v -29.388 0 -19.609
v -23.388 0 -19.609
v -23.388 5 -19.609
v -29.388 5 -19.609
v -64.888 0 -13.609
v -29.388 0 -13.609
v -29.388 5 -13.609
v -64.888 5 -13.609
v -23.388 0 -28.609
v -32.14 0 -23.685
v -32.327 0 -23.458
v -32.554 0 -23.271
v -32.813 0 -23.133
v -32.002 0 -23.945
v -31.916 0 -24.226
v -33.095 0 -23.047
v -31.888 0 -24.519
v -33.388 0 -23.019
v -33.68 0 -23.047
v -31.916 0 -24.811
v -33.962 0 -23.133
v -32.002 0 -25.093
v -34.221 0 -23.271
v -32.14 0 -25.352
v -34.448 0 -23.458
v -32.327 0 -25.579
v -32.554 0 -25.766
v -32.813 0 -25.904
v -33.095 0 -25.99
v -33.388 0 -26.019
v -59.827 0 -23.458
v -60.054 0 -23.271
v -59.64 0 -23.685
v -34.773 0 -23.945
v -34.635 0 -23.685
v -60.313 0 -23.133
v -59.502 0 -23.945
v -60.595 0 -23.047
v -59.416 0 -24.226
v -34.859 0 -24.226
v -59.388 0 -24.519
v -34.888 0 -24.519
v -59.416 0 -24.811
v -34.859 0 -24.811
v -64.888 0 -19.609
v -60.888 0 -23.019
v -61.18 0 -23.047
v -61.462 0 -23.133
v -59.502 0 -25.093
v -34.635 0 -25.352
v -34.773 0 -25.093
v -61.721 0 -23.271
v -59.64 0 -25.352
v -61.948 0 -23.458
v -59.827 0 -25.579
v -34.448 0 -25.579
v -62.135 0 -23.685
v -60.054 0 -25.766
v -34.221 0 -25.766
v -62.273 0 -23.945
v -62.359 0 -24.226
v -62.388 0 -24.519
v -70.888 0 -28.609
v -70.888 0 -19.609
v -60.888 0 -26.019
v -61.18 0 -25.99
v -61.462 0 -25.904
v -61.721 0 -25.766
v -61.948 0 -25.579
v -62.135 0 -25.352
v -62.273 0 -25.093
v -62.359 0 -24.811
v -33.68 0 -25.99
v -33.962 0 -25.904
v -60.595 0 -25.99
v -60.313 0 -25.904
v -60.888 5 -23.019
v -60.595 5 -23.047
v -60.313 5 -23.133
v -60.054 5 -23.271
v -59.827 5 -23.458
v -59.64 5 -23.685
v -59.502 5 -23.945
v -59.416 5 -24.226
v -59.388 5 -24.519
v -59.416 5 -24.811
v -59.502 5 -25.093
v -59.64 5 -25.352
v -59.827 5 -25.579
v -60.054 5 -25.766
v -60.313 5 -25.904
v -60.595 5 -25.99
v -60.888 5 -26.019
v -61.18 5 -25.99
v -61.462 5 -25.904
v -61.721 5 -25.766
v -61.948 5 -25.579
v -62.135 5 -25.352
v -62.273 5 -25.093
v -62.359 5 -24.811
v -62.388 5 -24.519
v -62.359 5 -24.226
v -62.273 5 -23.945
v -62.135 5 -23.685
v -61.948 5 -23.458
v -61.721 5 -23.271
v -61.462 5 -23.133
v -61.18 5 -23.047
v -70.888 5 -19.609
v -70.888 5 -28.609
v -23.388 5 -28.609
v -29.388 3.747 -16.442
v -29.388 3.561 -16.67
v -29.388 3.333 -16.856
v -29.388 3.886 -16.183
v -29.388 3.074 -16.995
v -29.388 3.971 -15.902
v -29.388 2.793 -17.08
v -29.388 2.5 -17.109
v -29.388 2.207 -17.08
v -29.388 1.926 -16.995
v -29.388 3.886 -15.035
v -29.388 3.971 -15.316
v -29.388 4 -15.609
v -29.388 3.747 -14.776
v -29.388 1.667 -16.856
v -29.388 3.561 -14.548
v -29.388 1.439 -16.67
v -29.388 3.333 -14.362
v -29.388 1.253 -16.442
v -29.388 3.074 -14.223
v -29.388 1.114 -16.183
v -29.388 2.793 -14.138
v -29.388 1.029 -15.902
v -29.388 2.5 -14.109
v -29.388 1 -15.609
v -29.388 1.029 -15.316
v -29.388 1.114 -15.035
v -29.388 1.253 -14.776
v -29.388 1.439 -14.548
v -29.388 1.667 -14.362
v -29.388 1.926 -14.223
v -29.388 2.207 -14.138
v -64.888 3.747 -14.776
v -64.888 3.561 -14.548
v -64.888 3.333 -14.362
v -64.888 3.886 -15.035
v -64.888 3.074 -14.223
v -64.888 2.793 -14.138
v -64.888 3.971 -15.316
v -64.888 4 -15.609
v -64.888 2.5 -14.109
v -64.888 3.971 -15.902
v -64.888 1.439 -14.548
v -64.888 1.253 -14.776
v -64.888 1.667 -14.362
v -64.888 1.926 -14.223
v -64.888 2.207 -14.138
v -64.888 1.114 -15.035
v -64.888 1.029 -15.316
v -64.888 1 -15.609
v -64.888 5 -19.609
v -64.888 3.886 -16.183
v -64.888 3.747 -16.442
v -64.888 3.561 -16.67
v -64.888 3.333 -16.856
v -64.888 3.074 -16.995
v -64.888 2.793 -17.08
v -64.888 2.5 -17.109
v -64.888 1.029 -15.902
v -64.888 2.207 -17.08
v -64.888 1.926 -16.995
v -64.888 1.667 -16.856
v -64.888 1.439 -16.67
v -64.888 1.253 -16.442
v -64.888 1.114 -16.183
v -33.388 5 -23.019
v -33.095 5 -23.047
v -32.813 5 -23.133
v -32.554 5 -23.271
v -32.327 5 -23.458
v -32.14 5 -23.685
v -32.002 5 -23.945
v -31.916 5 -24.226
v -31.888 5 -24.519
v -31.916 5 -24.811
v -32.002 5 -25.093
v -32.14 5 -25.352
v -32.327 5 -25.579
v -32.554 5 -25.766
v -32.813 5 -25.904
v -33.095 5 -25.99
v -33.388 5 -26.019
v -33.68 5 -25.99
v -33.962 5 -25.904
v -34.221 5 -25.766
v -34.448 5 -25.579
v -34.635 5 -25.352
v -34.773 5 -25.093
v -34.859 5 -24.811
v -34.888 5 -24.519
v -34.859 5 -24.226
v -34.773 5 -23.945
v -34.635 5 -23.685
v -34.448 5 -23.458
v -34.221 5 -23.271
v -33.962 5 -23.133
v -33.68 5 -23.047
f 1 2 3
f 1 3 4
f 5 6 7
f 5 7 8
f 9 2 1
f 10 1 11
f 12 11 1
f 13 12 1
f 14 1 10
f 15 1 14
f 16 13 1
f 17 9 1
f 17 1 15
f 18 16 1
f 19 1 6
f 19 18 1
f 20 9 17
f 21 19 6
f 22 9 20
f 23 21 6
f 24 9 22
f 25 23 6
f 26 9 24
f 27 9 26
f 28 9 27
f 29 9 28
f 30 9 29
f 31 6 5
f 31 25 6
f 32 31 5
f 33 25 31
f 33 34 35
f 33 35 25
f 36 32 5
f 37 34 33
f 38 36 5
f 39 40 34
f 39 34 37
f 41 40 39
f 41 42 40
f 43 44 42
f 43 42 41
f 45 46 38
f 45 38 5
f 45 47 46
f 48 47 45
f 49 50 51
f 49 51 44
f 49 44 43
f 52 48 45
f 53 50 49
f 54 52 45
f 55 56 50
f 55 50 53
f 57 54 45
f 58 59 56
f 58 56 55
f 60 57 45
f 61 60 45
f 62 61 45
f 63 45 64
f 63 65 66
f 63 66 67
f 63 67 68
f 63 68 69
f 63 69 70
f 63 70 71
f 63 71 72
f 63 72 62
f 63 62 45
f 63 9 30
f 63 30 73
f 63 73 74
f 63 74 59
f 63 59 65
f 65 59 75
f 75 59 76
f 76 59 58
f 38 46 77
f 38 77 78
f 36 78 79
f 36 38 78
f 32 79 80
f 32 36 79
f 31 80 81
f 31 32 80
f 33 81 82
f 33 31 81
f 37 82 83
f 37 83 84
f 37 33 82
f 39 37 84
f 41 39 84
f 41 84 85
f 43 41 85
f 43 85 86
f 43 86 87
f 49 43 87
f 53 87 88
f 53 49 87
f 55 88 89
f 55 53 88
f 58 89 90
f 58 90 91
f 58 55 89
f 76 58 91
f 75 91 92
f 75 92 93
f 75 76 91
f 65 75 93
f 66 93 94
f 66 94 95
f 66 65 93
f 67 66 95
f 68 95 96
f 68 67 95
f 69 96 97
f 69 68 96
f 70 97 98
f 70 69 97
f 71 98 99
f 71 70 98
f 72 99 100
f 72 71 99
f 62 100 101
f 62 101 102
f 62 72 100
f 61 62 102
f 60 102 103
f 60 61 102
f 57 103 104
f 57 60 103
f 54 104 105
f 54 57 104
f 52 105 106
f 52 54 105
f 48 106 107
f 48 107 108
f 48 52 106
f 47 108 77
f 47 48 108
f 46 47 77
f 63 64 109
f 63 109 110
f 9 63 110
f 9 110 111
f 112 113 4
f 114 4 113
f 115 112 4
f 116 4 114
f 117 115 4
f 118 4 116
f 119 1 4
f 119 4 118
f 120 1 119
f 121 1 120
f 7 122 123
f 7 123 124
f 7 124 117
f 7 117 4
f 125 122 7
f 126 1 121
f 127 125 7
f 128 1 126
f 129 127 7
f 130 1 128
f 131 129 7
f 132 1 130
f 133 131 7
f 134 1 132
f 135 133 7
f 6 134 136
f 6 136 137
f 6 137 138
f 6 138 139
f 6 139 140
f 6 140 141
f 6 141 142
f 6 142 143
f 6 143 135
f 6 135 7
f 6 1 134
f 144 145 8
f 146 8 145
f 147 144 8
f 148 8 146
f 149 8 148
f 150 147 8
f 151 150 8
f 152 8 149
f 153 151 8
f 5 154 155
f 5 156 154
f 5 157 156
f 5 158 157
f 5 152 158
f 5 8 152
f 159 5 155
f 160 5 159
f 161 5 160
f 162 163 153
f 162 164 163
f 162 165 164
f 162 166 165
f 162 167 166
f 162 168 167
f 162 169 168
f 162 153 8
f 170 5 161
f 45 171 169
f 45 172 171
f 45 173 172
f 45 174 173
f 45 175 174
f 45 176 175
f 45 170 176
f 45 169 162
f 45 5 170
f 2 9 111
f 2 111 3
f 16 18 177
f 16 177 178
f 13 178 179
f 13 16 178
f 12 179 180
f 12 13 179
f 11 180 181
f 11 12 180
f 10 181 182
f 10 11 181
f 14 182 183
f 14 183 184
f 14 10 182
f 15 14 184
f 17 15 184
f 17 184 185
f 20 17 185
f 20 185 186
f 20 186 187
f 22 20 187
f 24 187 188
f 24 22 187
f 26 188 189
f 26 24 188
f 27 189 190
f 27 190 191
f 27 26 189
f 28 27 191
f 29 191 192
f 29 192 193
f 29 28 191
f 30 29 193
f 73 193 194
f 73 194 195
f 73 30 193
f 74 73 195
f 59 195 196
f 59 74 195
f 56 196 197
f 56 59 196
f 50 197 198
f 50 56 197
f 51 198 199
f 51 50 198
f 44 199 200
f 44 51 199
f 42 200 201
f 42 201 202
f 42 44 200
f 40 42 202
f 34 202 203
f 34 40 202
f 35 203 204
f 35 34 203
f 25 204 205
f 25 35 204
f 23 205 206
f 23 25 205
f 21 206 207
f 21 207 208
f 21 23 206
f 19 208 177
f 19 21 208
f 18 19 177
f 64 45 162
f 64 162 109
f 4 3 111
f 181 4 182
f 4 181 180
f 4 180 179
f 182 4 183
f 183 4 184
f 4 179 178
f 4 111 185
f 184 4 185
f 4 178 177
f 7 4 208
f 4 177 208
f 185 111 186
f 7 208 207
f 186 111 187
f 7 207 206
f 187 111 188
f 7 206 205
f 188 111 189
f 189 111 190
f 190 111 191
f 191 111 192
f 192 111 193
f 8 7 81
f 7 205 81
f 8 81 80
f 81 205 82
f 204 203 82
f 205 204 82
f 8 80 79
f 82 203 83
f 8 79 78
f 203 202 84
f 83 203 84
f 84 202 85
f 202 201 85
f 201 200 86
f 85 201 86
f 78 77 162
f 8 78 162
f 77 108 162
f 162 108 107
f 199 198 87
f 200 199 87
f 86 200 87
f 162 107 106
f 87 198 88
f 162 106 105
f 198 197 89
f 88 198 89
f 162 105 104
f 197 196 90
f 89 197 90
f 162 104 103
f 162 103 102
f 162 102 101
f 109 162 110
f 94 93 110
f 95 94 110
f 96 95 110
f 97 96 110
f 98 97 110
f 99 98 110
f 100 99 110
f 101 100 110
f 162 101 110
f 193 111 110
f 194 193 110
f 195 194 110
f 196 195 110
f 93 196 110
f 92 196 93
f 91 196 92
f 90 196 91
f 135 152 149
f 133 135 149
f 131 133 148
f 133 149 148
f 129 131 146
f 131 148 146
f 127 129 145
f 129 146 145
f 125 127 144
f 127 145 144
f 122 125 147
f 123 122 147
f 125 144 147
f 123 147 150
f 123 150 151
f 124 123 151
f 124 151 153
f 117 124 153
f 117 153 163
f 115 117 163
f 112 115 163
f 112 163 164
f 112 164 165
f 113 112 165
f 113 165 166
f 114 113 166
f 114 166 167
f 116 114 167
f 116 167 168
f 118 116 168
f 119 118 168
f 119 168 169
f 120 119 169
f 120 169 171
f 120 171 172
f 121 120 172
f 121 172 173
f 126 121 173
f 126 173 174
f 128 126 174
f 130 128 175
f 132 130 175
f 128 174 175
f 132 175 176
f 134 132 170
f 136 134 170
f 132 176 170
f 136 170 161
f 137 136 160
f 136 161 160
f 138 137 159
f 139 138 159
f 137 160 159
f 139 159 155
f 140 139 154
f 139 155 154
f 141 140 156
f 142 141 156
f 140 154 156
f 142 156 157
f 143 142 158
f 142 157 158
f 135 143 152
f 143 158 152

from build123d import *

# Parameters (mm, degrees)
SKETCH2_R           = 1.5
BOSS_EXTRUDE1_DEPTH = 5
SKETCH4_R           = 1.5
CUT_EXTRUDE1_DEPTH  = 51.652969899


with BuildPart() as part:
    # Sketch2 → Boss-Extrude1 (new body)
    with BuildSketch(Plane(origin=(0, 0, 0), x_dir=(1, 0, 0), z_dir=(0, 1, 0))):
        Polygon((-70.88750853, 28.608973411), (-23.38750853, 28.608973411), (-23.38750853, 19.608973411), (-29.38750853, 19.608973411), (-29.38750853, 13.608973411), (-64.88750853, 13.608973411), (-64.88750853, 19.608973411), (-70.88750853, 19.608973411), align=None)
        with Locations(Location((-60.88750853, 24.518639814, 0), (0, 0, 270))):
            Circle(SKETCH2_R, mode=Mode.SUBTRACT)
        with Locations(Location((-33.38750853, 24.518639814, 0), (0, 0, 270))):
            Circle(SKETCH2_R, mode=Mode.SUBTRACT)
    extrude(amount=BOSS_EXTRUDE1_DEPTH)

    # Sketch4 → Cut-Extrude1 (cut, through all)
    with BuildSketch(Plane.ZY.offset(64.88750853)):
        with Locations((-15.608973411, 2.5)):
            Circle(SKETCH4_R)
    extrude(amount=-CUT_EXTRUDE1_DEPTH, mode=Mode.SUBTRACT)


solid = part.part
